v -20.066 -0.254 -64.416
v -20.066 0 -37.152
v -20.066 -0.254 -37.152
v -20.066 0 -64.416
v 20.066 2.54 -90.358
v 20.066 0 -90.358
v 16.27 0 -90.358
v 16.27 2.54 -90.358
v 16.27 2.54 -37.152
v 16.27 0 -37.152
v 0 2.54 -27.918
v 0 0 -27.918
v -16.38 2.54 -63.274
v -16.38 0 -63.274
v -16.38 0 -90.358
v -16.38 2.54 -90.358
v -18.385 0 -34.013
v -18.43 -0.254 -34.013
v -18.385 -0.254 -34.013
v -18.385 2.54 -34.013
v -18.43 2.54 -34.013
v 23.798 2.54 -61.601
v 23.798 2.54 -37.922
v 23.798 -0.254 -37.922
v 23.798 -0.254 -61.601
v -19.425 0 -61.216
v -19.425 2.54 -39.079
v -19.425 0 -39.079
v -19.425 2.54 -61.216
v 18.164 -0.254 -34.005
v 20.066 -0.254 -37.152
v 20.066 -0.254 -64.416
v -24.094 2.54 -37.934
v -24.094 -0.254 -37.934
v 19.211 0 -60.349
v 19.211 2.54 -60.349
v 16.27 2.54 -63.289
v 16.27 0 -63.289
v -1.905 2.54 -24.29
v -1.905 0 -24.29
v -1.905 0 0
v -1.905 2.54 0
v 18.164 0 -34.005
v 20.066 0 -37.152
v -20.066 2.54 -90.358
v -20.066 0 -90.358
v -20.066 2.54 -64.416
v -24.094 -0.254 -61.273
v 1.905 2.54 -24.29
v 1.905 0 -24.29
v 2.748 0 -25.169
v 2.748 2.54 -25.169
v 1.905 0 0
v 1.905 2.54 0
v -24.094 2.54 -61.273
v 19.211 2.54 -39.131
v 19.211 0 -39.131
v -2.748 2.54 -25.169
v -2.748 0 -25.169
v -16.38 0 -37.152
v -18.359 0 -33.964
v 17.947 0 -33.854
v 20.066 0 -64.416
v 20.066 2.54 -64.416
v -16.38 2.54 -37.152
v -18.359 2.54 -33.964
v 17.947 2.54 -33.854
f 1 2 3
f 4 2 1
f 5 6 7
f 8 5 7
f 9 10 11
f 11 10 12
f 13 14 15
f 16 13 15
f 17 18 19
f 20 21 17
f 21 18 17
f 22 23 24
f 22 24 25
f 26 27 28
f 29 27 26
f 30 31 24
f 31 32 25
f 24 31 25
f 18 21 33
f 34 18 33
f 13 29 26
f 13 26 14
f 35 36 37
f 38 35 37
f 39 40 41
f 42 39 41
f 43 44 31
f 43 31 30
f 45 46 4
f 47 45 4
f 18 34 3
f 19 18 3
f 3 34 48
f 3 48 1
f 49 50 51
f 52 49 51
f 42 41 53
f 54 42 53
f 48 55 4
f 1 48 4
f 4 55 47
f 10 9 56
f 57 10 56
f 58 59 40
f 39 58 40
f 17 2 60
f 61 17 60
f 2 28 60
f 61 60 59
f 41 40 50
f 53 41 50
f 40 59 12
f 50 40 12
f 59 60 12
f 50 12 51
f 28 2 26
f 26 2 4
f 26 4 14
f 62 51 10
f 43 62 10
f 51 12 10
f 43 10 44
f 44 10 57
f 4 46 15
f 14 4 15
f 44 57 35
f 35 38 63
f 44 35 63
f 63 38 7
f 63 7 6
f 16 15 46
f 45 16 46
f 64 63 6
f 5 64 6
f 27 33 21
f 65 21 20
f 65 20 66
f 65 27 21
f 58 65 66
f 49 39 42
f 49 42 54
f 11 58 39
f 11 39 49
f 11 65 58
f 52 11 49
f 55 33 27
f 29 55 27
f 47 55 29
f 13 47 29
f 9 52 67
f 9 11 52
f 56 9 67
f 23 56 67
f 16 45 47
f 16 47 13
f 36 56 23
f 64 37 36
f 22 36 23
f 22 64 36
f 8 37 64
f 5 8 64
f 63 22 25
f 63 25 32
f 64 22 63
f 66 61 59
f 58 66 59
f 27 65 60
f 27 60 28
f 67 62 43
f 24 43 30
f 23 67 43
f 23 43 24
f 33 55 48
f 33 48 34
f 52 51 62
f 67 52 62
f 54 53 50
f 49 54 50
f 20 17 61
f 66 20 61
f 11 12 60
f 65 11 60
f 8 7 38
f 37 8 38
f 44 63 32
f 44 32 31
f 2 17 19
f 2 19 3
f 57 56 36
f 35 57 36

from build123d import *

# Parameters (mm, degrees)
BOSS_EXTRUDE1_DEPTH = 2.54
BOSS_EXTRUDE3_DEPTH = 2.794
BOSS_EXTRUDE4_DEPTH = 2.794
CUT_EXTRUDE1_DEPTH  = 2.794
CUT_EXTRUDE2_DEPTH  = 2.794
CUT_EXTRUDE3_DEPTH  = 2.794
CUT_EXTRUDE4_DEPTH  = 2.794


with BuildPart() as part:
    # Sketch2 → Boss-Extrude1 (new body)
    with BuildSketch(Plane(origin=(0, 0, 0), x_dir=(1, 0, 0), z_dir=(0, 1, 0))):
        Polygon((-1.905, 0), (1.905, 0), (1.905, 24.289959425), (2.748388443, 25.169443727), (18.139363721, 33.964286743), (20.066, 37.152417336), (20.066, 90.357876746), (16.27045958, 90.357876746), (16.27045958, 37.152417336), (0, 27.917832169), (-16.380395118, 37.152417336), (-16.380395118, 90.357876746), (-20.066, 90.357876746), (-20.066, 37.152417336), (-18.359234796, 33.964286743), (-2.748388443, 25.169443727), (-1.905, 24.289959425), align=None)
    extrude(amount=BOSS_EXTRUDE1_DEPTH)

    # Sketch3 → Boss-Extrude3 (add)
    with BuildSketch(Plane(origin=(0, 2.54, 0), x_dir=(1, 0, 0), z_dir=(0, 1, 0))):
        Polygon((-20.066, 64.416430686), (-23.843651965, 64.416430686), (-24.093769894, 64.416430686), (-24.093769894, 34.012983608), (-18.385304655, 34.012983608), (-20.066, 37.152417336), align=None)
    extrude(amount=-BOSS_EXTRUDE3_DEPTH)

    # Sketch5 → Boss-Extrude4 (add)
    with BuildSketch(Plane(origin=(0, 2.54, 0), x_dir=(1, 0, 0), z_dir=(0, 1, 0))):
        Polygon((23.79791373, 64.416430686), (20.066, 64.416430686), (20.066, 37.152417336), (18.139363721, 33.964286743), (17.94697653, 33.854351205), (23.79791373, 33.854351205), align=None)
    extrude(amount=-BOSS_EXTRUDE4_DEPTH)

    # Sketch6 → Cut-Extrude1 (cut)
    with BuildSketch(Plane(origin=(0, 2.54, 0), x_dir=(1, 0, 0), z_dir=(0, 1, 0))):
        Polygon((-16.380395118, 37.152417336), (-19.425262821, 39.079248043), (-19.425262821, 61.216281017), (-16.380395118, 63.274089716), align=None)
    extrude(amount=-CUT_EXTRUDE1_DEPTH, mode=Mode.SUBTRACT)

    # Sketch7 → Cut-Extrude2 (cut)
    with BuildSketch(Plane(origin=(0, 2.54, 0), x_dir=(1, 0, 0), z_dir=(0, 1, 0))):
        Polygon((16.27045958, 37.152417336), (19.210779399, 39.131257015), (19.210779399, 60.348815791), (16.022648806, 63.536946385), align=None)
    extrude(amount=-CUT_EXTRUDE2_DEPTH, mode=Mode.SUBTRACT)

    # Sketch8 → Cut-Extrude3 (cut)
    with BuildSketch(Plane(origin=(0, 2.54, 0), x_dir=(1, 0, 0), z_dir=(0, 1, 0))):
        Polygon((-18.359234796, 33.964286743), (-25.982779442, 39.241192553), (-25.982779442, 59.799138103), (-20.066, 64.416430686), (-26.704115548, 65.235310973), (-32.139169553, 50.784424011), (-24.093769894, 30.886091687), align=None)
    extrude(amount=-CUT_EXTRUDE3_DEPTH, mode=Mode.SUBTRACT)

    # Sketch9 → Cut-Extrude4 (cut)
    with BuildSketch(Plane(origin=(0, 2.54, 0), x_dir=(1, 0, 0), z_dir=(0, 1, 0))):
        Polygon((17.94697653, 33.854351205), (23.79791373, 37.9219661), (26.535723591, 53.149224599), (25.166818661, 60.568686867), (20.066, 64.416430686), (22.61640933, 67.797418641), (32.063184465, 64.416430686), (29.094924947, 33.854351205), (20.441248246, 27.838251042), align=None)
    extrude(amount=-CUT_EXTRUDE4_DEPTH, mode=Mode.SUBTRACT)


solid = part.part
